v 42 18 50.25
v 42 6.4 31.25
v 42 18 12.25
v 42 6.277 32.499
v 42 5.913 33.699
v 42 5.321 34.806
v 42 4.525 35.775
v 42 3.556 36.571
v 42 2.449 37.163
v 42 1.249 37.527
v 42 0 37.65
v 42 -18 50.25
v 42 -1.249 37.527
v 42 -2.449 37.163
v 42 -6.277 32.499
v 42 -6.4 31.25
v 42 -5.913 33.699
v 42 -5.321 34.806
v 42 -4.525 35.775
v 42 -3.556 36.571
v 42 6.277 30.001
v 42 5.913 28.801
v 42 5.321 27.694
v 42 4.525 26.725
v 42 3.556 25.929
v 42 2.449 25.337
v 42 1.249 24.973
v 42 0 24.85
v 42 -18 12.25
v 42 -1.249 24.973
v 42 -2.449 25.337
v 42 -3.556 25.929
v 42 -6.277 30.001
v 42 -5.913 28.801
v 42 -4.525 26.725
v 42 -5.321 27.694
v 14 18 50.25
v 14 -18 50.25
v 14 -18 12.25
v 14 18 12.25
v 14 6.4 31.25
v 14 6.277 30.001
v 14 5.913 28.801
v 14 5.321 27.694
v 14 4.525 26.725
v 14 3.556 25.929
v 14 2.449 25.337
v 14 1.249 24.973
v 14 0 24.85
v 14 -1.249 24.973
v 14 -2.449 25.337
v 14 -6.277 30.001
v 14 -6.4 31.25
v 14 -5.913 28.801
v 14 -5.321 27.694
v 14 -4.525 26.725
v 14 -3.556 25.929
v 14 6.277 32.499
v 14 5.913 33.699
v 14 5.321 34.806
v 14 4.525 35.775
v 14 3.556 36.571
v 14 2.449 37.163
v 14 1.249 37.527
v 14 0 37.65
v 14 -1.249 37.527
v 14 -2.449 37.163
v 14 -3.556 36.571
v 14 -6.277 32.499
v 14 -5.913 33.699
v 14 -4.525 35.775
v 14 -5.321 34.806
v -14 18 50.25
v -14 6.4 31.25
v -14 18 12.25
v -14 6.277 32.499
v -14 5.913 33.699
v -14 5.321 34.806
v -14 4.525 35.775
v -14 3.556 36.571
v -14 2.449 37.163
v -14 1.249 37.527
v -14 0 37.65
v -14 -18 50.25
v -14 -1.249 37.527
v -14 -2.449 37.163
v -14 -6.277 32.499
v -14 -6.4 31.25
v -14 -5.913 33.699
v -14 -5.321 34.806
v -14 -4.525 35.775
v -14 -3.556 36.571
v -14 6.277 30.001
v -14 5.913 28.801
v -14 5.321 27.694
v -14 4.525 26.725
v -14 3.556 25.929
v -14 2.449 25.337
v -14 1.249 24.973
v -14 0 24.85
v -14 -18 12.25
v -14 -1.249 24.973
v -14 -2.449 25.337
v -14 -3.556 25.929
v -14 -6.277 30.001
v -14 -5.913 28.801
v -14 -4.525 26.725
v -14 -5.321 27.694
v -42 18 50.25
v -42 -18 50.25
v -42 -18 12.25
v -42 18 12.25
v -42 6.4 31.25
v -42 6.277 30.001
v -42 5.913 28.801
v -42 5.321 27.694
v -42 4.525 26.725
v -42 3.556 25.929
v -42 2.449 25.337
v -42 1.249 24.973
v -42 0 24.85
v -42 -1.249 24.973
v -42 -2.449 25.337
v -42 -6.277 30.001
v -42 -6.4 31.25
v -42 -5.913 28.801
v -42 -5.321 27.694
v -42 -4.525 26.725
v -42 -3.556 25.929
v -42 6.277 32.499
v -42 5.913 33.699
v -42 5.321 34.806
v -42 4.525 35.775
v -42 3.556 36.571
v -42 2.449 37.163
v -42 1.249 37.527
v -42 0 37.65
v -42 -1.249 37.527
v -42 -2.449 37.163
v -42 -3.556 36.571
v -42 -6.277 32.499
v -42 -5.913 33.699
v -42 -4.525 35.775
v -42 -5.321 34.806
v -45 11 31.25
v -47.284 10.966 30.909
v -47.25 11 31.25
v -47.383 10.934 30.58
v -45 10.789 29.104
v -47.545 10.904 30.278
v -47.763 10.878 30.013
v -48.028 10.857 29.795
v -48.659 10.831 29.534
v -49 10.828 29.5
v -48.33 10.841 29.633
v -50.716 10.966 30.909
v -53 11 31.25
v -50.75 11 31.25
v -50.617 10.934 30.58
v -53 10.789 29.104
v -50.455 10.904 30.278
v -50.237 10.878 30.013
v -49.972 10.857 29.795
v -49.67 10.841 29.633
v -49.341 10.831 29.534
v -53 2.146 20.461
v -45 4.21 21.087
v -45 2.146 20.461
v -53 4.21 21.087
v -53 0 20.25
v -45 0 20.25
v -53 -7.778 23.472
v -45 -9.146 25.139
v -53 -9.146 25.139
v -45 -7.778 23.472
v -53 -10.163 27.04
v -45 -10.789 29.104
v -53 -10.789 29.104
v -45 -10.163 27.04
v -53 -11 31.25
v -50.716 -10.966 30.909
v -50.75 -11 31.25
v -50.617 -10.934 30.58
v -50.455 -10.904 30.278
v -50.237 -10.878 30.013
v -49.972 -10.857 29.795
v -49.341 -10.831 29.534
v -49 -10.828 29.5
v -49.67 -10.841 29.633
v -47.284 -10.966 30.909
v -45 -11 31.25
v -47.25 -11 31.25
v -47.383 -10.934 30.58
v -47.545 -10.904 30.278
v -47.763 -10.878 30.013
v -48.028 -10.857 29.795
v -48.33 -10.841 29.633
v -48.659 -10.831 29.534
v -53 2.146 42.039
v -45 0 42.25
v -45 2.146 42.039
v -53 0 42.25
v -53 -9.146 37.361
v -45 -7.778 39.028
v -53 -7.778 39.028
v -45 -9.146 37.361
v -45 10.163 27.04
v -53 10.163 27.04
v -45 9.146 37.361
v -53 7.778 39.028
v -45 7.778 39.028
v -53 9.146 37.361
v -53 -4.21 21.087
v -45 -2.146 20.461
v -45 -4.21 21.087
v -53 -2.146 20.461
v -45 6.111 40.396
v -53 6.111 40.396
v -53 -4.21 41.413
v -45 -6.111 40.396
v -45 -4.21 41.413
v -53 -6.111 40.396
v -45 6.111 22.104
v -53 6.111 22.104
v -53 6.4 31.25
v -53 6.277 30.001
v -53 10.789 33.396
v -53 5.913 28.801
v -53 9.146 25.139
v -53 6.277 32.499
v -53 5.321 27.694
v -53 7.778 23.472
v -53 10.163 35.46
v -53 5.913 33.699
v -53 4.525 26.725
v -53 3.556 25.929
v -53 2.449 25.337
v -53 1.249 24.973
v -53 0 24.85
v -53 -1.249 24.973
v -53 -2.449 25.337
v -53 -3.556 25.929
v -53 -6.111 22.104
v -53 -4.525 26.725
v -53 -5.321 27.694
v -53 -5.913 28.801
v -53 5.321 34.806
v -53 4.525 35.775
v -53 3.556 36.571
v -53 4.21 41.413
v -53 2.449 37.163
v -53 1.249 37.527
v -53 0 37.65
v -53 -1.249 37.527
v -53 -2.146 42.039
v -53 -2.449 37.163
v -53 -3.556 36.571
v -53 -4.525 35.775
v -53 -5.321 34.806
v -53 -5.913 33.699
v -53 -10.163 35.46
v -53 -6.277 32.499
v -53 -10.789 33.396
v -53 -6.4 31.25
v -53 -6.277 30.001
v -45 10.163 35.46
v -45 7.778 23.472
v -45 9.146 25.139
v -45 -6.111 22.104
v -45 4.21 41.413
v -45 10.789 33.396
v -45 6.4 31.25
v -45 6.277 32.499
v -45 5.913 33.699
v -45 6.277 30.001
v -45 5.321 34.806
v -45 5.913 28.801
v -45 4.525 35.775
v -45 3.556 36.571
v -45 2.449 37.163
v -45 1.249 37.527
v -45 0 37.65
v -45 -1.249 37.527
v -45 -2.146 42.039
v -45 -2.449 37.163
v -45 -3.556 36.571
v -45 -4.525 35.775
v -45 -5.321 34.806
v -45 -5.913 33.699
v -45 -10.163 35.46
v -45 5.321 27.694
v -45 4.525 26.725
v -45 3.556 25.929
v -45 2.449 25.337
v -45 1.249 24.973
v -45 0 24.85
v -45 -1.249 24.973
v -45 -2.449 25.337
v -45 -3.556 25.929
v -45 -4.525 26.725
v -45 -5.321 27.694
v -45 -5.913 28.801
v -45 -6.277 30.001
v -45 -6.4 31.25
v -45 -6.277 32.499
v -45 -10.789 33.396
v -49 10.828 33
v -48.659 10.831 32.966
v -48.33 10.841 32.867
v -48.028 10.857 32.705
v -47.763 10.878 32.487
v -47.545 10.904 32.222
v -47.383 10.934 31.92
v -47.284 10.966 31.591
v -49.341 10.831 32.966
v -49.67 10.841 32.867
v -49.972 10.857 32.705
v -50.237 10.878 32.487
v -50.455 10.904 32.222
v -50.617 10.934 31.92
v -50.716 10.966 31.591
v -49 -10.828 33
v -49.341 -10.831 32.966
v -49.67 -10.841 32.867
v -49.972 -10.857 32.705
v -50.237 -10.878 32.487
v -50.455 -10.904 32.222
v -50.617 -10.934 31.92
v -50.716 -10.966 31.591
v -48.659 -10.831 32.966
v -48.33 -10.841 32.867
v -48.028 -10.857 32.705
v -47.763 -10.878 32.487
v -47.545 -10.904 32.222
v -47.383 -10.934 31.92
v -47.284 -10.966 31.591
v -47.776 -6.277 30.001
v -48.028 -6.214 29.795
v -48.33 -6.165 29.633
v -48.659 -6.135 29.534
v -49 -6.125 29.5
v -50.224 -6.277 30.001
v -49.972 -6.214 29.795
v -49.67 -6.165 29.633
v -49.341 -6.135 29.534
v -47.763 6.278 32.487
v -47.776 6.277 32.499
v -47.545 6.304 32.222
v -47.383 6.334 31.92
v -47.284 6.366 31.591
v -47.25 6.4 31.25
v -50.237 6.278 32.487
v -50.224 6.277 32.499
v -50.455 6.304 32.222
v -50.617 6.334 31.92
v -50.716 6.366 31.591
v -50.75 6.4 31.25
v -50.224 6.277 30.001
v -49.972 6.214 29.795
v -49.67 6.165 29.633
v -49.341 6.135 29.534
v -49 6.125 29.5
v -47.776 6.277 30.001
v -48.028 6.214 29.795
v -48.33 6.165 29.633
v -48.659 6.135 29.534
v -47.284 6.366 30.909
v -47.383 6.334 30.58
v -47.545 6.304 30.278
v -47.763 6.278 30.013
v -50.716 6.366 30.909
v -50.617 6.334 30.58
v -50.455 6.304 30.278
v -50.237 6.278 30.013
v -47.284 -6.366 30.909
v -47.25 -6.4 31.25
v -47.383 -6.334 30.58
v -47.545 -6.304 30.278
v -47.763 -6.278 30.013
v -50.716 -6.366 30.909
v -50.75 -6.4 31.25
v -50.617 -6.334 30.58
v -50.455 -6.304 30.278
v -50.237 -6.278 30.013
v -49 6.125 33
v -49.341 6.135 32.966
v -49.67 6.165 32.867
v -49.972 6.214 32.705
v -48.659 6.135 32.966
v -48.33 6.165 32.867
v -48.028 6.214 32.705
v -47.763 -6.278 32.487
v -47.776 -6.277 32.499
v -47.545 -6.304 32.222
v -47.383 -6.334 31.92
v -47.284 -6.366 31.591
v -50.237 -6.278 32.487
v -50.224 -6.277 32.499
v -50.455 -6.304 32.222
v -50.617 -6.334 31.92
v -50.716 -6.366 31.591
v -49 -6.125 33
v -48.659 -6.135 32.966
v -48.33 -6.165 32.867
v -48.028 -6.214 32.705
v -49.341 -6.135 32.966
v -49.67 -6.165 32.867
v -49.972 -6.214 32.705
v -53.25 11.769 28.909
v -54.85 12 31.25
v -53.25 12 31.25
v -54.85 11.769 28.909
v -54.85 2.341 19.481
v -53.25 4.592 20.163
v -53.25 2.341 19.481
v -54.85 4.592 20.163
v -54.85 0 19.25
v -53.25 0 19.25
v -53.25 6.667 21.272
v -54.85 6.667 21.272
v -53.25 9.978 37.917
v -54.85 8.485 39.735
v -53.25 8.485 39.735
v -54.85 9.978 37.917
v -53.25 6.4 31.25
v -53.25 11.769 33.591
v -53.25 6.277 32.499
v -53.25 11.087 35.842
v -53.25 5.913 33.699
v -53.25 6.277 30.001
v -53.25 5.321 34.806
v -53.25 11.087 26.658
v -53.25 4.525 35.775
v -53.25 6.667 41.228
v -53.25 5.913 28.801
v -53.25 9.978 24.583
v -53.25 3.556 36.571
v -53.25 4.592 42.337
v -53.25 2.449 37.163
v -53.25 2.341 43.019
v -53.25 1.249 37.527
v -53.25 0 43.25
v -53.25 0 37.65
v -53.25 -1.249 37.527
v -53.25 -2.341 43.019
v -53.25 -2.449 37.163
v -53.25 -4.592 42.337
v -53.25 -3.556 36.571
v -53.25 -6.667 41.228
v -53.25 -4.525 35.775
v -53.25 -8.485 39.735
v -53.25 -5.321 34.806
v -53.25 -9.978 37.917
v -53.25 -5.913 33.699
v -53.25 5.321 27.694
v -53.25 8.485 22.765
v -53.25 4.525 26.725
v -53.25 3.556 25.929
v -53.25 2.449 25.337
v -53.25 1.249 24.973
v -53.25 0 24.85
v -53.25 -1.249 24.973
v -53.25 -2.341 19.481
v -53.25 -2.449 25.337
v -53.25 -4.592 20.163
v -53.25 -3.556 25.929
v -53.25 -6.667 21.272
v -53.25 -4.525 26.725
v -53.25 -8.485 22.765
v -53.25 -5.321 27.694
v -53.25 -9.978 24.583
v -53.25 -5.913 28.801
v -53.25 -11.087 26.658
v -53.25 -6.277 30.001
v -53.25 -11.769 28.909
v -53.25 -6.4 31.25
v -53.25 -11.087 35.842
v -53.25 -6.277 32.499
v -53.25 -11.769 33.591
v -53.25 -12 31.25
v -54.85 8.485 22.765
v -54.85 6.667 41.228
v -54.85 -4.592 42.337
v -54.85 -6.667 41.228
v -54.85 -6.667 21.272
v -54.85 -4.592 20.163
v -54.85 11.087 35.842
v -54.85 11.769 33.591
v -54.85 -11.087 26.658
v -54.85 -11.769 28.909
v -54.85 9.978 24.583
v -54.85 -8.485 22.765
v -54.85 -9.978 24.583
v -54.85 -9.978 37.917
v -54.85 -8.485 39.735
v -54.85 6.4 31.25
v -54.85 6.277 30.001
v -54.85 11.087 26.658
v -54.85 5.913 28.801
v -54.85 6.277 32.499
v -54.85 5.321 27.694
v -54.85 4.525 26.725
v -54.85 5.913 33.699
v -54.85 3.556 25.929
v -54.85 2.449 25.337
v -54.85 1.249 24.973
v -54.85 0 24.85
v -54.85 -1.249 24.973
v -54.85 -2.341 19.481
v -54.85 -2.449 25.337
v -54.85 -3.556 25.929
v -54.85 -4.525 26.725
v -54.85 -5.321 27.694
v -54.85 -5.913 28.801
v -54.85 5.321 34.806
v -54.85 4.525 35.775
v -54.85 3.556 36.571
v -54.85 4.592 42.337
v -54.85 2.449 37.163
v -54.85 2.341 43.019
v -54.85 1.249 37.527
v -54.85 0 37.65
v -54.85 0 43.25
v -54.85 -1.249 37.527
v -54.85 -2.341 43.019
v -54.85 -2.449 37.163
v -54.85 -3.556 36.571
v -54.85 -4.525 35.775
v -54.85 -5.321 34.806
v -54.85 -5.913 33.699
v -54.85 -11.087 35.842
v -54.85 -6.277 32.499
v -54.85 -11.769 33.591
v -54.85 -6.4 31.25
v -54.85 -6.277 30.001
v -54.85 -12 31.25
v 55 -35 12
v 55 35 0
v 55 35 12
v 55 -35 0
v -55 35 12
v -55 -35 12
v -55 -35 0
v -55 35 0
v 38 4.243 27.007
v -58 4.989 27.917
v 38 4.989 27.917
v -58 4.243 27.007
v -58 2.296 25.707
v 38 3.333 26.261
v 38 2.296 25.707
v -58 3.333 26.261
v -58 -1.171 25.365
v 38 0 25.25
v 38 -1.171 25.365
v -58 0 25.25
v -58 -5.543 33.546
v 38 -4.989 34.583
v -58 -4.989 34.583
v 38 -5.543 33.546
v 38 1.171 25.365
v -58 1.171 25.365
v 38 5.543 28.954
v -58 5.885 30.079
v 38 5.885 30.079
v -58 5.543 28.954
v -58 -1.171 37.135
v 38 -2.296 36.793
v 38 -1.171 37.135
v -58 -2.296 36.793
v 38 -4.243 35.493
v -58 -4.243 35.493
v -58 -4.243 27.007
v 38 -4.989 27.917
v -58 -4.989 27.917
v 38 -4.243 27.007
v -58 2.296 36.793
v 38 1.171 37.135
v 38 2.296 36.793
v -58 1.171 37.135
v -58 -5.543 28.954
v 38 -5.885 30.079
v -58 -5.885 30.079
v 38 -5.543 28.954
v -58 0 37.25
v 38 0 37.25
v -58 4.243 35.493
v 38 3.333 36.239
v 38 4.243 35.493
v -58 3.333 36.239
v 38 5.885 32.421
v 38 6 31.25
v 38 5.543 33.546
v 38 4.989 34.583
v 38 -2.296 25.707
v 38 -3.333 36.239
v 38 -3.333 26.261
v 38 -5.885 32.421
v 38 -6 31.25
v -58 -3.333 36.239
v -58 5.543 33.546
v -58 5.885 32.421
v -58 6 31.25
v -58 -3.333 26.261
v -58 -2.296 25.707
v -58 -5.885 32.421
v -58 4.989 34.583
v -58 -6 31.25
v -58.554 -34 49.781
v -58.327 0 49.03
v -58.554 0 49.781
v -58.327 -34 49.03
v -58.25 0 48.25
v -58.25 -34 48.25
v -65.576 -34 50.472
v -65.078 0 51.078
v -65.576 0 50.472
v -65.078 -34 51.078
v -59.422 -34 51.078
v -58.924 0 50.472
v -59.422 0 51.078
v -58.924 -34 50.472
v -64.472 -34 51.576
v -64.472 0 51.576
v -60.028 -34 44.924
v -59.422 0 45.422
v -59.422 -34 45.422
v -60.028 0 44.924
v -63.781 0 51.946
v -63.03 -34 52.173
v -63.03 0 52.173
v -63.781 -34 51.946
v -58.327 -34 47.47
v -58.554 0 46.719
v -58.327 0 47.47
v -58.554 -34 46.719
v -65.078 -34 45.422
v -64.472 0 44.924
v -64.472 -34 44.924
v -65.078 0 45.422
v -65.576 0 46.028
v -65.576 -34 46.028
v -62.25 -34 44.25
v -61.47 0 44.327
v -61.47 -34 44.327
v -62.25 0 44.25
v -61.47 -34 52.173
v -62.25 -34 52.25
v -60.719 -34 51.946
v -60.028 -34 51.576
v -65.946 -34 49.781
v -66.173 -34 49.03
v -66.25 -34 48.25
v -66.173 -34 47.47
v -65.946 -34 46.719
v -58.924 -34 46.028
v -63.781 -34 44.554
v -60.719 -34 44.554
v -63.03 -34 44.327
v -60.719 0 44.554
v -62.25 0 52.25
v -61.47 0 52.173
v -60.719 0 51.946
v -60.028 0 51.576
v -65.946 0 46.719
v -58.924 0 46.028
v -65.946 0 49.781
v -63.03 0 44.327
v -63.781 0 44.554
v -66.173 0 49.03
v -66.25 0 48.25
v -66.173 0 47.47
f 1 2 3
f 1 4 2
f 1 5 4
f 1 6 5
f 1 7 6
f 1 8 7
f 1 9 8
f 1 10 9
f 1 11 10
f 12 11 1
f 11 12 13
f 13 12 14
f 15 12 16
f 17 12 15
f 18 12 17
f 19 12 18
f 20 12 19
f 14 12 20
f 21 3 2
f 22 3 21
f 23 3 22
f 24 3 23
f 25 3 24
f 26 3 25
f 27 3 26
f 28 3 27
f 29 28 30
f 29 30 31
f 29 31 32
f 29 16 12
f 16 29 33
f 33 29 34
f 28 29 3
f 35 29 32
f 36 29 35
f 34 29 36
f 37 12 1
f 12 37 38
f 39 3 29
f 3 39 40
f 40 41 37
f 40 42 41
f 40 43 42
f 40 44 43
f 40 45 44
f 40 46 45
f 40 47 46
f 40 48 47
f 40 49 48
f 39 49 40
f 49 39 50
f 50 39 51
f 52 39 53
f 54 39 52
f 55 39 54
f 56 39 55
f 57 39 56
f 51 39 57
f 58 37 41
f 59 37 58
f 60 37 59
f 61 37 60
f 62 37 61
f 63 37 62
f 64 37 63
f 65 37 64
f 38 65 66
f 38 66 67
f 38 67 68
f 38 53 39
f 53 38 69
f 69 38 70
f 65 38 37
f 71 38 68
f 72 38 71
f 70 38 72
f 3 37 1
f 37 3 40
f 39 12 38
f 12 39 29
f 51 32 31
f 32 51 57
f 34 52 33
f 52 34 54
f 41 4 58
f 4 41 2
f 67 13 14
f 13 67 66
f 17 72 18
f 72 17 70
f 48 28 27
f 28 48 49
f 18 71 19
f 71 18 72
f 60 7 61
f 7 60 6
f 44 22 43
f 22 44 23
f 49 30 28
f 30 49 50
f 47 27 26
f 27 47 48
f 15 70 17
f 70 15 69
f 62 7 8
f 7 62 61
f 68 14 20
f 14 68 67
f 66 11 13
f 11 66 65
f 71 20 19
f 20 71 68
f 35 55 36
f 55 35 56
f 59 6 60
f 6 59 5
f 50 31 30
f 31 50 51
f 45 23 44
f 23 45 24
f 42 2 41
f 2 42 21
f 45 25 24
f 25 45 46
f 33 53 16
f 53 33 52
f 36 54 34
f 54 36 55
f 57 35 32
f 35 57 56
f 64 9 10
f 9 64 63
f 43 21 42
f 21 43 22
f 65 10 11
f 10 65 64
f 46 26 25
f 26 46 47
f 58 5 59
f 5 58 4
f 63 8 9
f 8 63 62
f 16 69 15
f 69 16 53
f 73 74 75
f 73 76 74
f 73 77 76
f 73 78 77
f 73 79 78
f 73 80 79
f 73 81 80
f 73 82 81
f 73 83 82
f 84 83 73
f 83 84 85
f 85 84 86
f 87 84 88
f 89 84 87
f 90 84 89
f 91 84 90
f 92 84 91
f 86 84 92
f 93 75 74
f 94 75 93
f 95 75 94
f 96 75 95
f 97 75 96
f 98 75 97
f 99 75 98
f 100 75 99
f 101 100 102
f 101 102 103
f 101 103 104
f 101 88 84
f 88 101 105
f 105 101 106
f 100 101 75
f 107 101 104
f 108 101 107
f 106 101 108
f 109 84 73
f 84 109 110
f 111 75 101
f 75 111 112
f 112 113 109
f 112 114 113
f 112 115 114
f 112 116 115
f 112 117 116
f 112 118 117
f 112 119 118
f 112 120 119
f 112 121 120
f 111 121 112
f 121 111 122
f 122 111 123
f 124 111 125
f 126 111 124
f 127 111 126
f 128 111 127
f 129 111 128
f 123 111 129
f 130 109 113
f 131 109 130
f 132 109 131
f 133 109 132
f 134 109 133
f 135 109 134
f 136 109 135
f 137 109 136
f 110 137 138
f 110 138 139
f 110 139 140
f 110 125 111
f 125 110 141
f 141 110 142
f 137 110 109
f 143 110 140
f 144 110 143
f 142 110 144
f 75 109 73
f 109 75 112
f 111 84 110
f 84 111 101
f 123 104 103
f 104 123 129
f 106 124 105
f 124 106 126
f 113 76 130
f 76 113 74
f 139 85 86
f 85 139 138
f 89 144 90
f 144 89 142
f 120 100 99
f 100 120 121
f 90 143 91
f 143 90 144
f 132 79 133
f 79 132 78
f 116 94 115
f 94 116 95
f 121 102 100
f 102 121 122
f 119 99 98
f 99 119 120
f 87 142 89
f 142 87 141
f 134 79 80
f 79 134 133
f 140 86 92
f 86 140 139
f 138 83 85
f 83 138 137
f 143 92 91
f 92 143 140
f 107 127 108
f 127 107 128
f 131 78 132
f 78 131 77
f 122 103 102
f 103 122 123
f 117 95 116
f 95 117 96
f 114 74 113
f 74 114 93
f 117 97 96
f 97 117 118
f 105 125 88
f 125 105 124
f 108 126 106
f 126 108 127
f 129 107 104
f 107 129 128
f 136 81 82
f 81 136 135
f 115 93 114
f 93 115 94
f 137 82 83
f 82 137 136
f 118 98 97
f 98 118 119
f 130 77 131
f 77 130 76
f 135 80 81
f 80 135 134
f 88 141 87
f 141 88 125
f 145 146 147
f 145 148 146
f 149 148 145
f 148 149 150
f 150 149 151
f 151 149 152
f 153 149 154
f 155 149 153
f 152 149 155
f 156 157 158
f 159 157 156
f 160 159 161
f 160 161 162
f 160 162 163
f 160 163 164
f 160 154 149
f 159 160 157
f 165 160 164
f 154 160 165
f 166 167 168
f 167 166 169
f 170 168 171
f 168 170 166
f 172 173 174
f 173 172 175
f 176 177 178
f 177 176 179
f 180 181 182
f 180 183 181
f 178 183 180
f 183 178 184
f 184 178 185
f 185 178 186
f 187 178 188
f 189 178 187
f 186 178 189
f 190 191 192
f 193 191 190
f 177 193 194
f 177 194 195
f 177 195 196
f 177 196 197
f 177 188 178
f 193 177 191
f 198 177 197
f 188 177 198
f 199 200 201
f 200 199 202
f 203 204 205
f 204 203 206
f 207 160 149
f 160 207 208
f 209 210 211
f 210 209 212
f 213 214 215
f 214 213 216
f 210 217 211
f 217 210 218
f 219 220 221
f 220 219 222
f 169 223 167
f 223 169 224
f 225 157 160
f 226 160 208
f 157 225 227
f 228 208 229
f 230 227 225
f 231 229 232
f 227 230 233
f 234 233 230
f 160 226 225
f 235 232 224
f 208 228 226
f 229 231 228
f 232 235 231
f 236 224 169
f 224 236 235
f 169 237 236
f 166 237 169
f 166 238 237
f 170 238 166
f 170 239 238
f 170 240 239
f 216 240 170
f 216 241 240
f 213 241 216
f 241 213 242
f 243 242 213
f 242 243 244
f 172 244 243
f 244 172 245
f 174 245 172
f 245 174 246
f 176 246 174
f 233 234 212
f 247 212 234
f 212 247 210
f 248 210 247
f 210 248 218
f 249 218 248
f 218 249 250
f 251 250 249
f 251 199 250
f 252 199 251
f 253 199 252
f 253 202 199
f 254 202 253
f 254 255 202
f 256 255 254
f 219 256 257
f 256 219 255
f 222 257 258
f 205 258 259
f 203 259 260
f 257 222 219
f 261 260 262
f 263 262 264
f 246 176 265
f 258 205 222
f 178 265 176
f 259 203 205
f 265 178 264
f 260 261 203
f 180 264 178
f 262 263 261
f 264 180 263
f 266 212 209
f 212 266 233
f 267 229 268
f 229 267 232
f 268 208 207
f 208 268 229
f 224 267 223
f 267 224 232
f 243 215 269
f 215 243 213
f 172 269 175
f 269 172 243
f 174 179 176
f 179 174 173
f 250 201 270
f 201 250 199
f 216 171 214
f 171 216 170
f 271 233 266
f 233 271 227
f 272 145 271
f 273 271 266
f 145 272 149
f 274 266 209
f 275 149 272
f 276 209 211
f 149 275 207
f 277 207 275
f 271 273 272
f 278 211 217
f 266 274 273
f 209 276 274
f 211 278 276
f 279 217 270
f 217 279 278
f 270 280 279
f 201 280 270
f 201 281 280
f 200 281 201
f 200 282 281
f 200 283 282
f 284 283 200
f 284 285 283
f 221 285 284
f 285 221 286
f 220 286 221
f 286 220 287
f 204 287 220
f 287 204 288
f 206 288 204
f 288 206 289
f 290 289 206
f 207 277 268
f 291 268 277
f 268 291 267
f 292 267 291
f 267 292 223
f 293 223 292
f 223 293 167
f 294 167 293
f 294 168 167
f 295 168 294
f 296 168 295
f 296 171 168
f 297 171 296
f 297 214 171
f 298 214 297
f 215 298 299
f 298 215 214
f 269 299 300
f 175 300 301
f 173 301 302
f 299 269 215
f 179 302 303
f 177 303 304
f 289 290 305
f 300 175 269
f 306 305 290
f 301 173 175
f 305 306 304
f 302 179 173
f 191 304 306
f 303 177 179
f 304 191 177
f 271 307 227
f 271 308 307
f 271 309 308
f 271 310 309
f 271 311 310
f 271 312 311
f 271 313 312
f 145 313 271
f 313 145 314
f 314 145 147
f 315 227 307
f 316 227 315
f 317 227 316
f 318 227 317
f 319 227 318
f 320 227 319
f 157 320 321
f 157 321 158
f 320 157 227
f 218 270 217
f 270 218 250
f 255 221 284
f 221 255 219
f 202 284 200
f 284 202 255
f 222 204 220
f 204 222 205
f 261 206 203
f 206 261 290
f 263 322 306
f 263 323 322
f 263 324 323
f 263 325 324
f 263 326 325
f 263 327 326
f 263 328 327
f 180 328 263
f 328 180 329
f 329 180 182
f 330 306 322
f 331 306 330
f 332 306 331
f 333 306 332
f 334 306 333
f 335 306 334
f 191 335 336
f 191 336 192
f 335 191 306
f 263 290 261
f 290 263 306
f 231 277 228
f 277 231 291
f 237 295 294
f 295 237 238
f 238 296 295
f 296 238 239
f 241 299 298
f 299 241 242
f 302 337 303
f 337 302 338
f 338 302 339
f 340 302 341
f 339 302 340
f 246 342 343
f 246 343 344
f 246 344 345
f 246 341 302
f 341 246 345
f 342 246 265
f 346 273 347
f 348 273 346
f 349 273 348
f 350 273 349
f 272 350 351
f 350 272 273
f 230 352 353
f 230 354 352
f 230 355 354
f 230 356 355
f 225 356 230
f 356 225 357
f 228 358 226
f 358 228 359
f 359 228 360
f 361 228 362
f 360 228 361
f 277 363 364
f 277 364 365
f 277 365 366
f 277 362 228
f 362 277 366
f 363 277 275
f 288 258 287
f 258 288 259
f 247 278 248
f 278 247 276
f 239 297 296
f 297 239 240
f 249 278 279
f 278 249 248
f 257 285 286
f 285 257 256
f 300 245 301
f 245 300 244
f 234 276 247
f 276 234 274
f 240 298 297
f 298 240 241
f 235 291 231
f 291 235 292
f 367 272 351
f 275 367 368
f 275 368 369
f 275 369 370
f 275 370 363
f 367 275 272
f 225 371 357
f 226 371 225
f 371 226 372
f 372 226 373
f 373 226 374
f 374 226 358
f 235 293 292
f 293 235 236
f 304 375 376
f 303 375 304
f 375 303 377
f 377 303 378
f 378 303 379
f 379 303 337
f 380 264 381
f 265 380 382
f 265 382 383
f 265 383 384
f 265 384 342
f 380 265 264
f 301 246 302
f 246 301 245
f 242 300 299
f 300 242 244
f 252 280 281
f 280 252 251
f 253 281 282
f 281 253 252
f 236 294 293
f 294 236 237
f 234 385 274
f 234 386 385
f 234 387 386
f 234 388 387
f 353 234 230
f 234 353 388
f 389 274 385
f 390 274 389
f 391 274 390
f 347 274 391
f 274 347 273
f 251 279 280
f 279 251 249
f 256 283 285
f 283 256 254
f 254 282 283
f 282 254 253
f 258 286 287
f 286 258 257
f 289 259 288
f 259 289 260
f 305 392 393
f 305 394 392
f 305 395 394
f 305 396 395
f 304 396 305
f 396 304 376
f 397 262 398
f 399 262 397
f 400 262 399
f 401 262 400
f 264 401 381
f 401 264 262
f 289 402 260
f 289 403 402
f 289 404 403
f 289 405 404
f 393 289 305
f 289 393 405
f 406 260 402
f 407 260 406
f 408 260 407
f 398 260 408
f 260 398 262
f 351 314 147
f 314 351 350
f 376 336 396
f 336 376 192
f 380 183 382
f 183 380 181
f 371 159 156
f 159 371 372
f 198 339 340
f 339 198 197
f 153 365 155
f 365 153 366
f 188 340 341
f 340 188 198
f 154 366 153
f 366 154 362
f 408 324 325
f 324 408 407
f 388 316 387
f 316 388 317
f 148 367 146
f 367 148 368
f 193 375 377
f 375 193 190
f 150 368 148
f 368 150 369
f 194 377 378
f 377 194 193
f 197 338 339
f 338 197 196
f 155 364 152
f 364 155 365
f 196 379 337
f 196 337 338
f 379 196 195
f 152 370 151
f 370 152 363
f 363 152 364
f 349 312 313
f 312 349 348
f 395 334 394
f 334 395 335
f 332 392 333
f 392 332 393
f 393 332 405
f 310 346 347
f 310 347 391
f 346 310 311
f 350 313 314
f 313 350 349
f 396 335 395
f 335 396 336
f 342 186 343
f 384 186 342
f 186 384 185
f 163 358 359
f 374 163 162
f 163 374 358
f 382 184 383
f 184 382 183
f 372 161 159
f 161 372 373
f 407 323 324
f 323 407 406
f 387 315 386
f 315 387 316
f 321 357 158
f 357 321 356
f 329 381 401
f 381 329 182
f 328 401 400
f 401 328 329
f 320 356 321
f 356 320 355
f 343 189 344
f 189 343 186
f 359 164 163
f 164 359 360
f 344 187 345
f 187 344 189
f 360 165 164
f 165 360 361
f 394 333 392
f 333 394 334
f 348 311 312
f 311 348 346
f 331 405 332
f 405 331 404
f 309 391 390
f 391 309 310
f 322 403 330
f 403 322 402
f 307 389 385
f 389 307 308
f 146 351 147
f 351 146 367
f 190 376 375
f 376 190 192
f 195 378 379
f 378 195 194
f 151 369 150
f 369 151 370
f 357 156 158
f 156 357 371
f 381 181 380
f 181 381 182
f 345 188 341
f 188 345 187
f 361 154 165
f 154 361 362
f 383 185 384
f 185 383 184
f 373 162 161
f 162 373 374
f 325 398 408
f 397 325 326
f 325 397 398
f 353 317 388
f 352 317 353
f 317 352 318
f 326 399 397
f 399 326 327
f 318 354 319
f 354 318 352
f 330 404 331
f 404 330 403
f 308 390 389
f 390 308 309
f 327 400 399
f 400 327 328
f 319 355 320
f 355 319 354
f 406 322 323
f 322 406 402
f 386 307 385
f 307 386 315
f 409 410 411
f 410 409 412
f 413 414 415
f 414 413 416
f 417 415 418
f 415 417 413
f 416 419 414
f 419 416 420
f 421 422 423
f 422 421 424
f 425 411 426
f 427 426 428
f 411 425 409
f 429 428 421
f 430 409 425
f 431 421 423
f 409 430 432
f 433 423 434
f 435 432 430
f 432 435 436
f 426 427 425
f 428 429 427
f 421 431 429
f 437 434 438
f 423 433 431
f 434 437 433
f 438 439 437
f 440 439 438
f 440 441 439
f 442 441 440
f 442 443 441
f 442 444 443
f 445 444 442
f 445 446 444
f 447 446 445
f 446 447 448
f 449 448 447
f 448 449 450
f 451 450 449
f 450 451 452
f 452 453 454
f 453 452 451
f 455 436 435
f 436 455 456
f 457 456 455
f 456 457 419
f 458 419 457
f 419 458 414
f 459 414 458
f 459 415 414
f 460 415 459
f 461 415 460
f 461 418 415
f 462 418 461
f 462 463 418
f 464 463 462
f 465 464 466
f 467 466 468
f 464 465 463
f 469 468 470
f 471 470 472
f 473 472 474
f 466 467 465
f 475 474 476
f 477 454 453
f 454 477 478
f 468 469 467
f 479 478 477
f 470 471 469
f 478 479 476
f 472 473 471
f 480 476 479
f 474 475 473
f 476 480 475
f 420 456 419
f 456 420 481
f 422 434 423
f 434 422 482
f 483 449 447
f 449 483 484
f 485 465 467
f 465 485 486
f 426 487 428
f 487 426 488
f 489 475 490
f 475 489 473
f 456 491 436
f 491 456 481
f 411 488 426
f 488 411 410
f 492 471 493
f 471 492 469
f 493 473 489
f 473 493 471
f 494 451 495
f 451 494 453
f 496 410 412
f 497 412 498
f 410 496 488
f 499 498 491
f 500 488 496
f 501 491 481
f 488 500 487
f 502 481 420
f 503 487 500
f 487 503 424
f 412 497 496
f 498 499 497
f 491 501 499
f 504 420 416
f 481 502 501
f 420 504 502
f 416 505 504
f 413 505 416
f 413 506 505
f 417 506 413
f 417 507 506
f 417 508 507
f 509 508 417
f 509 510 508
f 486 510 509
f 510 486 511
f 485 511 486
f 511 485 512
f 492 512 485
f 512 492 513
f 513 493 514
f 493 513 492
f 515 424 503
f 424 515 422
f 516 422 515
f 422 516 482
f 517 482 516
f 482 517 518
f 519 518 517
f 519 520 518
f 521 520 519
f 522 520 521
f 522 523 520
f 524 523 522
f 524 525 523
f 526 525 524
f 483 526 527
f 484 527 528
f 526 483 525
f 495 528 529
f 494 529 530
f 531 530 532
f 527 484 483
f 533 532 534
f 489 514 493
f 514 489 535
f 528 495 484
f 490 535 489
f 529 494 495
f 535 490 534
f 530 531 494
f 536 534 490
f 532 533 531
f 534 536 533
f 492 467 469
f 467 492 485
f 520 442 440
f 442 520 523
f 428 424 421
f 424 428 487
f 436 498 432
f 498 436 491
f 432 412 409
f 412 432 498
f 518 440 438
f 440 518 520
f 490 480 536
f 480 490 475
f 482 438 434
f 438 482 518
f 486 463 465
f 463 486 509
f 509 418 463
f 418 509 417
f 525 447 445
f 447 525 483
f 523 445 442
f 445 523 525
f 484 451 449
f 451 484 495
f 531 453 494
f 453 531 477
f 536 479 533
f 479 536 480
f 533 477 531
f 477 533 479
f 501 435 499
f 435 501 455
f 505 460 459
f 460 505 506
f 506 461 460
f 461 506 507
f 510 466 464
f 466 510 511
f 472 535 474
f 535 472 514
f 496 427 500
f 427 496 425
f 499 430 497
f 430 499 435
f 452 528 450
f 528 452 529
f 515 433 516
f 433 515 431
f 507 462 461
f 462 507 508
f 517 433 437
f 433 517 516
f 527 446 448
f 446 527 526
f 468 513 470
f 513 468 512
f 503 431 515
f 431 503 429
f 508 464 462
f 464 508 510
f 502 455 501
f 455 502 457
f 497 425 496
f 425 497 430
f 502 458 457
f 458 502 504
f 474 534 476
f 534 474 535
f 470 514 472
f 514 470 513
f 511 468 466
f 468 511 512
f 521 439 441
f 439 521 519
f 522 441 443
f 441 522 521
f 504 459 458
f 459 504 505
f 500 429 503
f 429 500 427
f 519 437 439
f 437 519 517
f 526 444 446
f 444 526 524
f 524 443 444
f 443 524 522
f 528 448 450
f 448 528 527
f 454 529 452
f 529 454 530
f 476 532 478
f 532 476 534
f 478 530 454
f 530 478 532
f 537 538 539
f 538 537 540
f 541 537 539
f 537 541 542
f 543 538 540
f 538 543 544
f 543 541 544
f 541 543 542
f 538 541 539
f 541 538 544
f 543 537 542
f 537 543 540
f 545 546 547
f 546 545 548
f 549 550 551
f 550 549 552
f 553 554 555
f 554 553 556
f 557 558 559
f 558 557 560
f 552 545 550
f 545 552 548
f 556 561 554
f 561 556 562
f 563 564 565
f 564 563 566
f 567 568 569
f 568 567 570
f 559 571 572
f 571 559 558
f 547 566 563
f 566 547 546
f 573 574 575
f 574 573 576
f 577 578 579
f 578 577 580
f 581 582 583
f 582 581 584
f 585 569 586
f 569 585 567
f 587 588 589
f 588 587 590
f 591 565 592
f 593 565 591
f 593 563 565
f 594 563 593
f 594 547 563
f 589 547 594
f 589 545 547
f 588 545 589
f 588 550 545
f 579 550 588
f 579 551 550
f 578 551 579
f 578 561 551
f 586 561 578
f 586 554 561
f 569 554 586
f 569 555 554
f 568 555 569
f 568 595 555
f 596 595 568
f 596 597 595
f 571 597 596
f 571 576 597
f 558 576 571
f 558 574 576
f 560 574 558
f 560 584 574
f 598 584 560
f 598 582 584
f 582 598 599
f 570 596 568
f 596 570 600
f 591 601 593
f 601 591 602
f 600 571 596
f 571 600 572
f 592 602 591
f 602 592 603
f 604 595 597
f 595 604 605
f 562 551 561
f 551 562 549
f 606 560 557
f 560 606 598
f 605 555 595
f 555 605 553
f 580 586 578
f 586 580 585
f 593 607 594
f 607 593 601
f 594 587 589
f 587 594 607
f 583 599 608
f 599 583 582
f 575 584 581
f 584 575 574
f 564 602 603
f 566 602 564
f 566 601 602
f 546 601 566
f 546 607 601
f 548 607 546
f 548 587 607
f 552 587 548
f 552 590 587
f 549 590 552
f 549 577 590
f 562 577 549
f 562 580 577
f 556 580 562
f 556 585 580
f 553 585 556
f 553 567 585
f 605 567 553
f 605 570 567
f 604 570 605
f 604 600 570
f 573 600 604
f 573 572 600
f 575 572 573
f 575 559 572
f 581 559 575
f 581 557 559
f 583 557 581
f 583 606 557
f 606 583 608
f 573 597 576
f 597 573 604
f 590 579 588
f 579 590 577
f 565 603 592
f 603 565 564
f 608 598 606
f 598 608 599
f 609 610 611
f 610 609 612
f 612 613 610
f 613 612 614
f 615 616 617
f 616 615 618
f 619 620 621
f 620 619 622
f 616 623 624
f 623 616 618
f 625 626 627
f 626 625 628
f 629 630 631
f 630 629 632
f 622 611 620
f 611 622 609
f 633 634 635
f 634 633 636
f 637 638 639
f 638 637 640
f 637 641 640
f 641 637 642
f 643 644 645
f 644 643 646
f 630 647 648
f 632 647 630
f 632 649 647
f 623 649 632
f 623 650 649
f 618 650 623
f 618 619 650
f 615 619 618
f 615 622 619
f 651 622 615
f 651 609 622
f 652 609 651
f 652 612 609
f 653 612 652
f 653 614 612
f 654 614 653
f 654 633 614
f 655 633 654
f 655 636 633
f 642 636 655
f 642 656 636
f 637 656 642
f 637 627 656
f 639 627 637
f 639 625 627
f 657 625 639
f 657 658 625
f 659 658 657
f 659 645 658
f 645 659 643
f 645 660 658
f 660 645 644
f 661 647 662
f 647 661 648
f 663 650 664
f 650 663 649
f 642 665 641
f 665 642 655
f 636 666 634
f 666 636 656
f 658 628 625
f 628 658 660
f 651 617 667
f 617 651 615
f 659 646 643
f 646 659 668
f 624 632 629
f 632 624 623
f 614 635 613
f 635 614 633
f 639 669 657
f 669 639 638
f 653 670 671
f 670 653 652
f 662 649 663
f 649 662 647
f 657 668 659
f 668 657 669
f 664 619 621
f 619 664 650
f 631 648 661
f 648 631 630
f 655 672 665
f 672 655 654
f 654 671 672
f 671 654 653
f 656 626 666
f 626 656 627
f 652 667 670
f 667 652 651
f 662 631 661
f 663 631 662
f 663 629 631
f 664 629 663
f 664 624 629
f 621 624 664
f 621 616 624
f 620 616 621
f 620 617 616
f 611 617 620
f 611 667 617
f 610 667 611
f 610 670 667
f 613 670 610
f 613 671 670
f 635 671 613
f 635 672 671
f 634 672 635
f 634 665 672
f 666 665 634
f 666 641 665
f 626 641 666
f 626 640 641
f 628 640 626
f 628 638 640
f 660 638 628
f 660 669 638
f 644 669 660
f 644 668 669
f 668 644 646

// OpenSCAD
$fn = 32;

// ------------------------------------------------------------------------
// Machine vise: screw d12, jaws 28 x 38 mm
// Every part is its own module, assembly() places every instance.
// ------------------------------------------------------------------------

// --- part 1 ---
module vise_bed() {
  difference() {
    translate([-55, -35, 0]) cube([110, 70, 12]);
  }
}

// --- part 2 ---
module vise_jaw() {
  difference() {
    translate([-14, -18, 0]) cube([28, 36, 38]);
    translate([0, 0, 19]) rotate([0, 90, 0]) cylinder(h = 30, d = 12.8, center = true);
  }
}

// --- part 3 ---
module vise_screw() {
  translate([0, 0, -48]) cylinder(h = 96, d = 12);
}

// --- part 4 ---
module screw_collar() {
  difference() {
    cylinder(h = 8, d = 22);
    translate([0, 0, -1]) cylinder(h = 10, d = 12.8);
    translate([0, 0, 4]) rotate([90, 0, 0]) cylinder(h = 24, d = 3.5, center = true);
  }
}

// --- part 5 ---
module screw_washer() {
  difference() {
      translate([0, 0, 0]) cylinder(h = 1.6, d = 24);
      translate([0, 0, -1]) cylinder(h = 3.6, d = 12.8);
    }
}

// --- part 6 ---
module vise_handle() {
  cylinder(h = 34, d = 8);
}

// --- assembly ---
module assembly() {
  color([0.80, 0.24, 0.20]) translate([0, 0, 0]) rotate([0, 0, 0]) vise_bed();
  color([0.20, 0.45, 0.75]) translate([28, 0, 12.25]) rotate([0, 0, 0]) vise_jaw();
  color([0.25, 0.62, 0.32]) translate([-28, 0, 12.25]) rotate([0, 0, 0]) vise_jaw();
  color([0.92, 0.70, 0.18]) translate([-10, 0, 31.25]) rotate([0, 90, 0]) vise_screw();
  color([0.58, 0.35, 0.70]) translate([-53, 0, 31.25]) rotate([0, 90, 0]) screw_collar();
  color([0.16, 0.66, 0.66]) translate([-54.85, 0, 31.25]) rotate([0, 90, 0]) screw_washer();
  color([0.85, 0.48, 0.18]) translate([-62.25, 0, 48.25]) rotate([90, 0, 0]) vise_handle();
}

assembly();
